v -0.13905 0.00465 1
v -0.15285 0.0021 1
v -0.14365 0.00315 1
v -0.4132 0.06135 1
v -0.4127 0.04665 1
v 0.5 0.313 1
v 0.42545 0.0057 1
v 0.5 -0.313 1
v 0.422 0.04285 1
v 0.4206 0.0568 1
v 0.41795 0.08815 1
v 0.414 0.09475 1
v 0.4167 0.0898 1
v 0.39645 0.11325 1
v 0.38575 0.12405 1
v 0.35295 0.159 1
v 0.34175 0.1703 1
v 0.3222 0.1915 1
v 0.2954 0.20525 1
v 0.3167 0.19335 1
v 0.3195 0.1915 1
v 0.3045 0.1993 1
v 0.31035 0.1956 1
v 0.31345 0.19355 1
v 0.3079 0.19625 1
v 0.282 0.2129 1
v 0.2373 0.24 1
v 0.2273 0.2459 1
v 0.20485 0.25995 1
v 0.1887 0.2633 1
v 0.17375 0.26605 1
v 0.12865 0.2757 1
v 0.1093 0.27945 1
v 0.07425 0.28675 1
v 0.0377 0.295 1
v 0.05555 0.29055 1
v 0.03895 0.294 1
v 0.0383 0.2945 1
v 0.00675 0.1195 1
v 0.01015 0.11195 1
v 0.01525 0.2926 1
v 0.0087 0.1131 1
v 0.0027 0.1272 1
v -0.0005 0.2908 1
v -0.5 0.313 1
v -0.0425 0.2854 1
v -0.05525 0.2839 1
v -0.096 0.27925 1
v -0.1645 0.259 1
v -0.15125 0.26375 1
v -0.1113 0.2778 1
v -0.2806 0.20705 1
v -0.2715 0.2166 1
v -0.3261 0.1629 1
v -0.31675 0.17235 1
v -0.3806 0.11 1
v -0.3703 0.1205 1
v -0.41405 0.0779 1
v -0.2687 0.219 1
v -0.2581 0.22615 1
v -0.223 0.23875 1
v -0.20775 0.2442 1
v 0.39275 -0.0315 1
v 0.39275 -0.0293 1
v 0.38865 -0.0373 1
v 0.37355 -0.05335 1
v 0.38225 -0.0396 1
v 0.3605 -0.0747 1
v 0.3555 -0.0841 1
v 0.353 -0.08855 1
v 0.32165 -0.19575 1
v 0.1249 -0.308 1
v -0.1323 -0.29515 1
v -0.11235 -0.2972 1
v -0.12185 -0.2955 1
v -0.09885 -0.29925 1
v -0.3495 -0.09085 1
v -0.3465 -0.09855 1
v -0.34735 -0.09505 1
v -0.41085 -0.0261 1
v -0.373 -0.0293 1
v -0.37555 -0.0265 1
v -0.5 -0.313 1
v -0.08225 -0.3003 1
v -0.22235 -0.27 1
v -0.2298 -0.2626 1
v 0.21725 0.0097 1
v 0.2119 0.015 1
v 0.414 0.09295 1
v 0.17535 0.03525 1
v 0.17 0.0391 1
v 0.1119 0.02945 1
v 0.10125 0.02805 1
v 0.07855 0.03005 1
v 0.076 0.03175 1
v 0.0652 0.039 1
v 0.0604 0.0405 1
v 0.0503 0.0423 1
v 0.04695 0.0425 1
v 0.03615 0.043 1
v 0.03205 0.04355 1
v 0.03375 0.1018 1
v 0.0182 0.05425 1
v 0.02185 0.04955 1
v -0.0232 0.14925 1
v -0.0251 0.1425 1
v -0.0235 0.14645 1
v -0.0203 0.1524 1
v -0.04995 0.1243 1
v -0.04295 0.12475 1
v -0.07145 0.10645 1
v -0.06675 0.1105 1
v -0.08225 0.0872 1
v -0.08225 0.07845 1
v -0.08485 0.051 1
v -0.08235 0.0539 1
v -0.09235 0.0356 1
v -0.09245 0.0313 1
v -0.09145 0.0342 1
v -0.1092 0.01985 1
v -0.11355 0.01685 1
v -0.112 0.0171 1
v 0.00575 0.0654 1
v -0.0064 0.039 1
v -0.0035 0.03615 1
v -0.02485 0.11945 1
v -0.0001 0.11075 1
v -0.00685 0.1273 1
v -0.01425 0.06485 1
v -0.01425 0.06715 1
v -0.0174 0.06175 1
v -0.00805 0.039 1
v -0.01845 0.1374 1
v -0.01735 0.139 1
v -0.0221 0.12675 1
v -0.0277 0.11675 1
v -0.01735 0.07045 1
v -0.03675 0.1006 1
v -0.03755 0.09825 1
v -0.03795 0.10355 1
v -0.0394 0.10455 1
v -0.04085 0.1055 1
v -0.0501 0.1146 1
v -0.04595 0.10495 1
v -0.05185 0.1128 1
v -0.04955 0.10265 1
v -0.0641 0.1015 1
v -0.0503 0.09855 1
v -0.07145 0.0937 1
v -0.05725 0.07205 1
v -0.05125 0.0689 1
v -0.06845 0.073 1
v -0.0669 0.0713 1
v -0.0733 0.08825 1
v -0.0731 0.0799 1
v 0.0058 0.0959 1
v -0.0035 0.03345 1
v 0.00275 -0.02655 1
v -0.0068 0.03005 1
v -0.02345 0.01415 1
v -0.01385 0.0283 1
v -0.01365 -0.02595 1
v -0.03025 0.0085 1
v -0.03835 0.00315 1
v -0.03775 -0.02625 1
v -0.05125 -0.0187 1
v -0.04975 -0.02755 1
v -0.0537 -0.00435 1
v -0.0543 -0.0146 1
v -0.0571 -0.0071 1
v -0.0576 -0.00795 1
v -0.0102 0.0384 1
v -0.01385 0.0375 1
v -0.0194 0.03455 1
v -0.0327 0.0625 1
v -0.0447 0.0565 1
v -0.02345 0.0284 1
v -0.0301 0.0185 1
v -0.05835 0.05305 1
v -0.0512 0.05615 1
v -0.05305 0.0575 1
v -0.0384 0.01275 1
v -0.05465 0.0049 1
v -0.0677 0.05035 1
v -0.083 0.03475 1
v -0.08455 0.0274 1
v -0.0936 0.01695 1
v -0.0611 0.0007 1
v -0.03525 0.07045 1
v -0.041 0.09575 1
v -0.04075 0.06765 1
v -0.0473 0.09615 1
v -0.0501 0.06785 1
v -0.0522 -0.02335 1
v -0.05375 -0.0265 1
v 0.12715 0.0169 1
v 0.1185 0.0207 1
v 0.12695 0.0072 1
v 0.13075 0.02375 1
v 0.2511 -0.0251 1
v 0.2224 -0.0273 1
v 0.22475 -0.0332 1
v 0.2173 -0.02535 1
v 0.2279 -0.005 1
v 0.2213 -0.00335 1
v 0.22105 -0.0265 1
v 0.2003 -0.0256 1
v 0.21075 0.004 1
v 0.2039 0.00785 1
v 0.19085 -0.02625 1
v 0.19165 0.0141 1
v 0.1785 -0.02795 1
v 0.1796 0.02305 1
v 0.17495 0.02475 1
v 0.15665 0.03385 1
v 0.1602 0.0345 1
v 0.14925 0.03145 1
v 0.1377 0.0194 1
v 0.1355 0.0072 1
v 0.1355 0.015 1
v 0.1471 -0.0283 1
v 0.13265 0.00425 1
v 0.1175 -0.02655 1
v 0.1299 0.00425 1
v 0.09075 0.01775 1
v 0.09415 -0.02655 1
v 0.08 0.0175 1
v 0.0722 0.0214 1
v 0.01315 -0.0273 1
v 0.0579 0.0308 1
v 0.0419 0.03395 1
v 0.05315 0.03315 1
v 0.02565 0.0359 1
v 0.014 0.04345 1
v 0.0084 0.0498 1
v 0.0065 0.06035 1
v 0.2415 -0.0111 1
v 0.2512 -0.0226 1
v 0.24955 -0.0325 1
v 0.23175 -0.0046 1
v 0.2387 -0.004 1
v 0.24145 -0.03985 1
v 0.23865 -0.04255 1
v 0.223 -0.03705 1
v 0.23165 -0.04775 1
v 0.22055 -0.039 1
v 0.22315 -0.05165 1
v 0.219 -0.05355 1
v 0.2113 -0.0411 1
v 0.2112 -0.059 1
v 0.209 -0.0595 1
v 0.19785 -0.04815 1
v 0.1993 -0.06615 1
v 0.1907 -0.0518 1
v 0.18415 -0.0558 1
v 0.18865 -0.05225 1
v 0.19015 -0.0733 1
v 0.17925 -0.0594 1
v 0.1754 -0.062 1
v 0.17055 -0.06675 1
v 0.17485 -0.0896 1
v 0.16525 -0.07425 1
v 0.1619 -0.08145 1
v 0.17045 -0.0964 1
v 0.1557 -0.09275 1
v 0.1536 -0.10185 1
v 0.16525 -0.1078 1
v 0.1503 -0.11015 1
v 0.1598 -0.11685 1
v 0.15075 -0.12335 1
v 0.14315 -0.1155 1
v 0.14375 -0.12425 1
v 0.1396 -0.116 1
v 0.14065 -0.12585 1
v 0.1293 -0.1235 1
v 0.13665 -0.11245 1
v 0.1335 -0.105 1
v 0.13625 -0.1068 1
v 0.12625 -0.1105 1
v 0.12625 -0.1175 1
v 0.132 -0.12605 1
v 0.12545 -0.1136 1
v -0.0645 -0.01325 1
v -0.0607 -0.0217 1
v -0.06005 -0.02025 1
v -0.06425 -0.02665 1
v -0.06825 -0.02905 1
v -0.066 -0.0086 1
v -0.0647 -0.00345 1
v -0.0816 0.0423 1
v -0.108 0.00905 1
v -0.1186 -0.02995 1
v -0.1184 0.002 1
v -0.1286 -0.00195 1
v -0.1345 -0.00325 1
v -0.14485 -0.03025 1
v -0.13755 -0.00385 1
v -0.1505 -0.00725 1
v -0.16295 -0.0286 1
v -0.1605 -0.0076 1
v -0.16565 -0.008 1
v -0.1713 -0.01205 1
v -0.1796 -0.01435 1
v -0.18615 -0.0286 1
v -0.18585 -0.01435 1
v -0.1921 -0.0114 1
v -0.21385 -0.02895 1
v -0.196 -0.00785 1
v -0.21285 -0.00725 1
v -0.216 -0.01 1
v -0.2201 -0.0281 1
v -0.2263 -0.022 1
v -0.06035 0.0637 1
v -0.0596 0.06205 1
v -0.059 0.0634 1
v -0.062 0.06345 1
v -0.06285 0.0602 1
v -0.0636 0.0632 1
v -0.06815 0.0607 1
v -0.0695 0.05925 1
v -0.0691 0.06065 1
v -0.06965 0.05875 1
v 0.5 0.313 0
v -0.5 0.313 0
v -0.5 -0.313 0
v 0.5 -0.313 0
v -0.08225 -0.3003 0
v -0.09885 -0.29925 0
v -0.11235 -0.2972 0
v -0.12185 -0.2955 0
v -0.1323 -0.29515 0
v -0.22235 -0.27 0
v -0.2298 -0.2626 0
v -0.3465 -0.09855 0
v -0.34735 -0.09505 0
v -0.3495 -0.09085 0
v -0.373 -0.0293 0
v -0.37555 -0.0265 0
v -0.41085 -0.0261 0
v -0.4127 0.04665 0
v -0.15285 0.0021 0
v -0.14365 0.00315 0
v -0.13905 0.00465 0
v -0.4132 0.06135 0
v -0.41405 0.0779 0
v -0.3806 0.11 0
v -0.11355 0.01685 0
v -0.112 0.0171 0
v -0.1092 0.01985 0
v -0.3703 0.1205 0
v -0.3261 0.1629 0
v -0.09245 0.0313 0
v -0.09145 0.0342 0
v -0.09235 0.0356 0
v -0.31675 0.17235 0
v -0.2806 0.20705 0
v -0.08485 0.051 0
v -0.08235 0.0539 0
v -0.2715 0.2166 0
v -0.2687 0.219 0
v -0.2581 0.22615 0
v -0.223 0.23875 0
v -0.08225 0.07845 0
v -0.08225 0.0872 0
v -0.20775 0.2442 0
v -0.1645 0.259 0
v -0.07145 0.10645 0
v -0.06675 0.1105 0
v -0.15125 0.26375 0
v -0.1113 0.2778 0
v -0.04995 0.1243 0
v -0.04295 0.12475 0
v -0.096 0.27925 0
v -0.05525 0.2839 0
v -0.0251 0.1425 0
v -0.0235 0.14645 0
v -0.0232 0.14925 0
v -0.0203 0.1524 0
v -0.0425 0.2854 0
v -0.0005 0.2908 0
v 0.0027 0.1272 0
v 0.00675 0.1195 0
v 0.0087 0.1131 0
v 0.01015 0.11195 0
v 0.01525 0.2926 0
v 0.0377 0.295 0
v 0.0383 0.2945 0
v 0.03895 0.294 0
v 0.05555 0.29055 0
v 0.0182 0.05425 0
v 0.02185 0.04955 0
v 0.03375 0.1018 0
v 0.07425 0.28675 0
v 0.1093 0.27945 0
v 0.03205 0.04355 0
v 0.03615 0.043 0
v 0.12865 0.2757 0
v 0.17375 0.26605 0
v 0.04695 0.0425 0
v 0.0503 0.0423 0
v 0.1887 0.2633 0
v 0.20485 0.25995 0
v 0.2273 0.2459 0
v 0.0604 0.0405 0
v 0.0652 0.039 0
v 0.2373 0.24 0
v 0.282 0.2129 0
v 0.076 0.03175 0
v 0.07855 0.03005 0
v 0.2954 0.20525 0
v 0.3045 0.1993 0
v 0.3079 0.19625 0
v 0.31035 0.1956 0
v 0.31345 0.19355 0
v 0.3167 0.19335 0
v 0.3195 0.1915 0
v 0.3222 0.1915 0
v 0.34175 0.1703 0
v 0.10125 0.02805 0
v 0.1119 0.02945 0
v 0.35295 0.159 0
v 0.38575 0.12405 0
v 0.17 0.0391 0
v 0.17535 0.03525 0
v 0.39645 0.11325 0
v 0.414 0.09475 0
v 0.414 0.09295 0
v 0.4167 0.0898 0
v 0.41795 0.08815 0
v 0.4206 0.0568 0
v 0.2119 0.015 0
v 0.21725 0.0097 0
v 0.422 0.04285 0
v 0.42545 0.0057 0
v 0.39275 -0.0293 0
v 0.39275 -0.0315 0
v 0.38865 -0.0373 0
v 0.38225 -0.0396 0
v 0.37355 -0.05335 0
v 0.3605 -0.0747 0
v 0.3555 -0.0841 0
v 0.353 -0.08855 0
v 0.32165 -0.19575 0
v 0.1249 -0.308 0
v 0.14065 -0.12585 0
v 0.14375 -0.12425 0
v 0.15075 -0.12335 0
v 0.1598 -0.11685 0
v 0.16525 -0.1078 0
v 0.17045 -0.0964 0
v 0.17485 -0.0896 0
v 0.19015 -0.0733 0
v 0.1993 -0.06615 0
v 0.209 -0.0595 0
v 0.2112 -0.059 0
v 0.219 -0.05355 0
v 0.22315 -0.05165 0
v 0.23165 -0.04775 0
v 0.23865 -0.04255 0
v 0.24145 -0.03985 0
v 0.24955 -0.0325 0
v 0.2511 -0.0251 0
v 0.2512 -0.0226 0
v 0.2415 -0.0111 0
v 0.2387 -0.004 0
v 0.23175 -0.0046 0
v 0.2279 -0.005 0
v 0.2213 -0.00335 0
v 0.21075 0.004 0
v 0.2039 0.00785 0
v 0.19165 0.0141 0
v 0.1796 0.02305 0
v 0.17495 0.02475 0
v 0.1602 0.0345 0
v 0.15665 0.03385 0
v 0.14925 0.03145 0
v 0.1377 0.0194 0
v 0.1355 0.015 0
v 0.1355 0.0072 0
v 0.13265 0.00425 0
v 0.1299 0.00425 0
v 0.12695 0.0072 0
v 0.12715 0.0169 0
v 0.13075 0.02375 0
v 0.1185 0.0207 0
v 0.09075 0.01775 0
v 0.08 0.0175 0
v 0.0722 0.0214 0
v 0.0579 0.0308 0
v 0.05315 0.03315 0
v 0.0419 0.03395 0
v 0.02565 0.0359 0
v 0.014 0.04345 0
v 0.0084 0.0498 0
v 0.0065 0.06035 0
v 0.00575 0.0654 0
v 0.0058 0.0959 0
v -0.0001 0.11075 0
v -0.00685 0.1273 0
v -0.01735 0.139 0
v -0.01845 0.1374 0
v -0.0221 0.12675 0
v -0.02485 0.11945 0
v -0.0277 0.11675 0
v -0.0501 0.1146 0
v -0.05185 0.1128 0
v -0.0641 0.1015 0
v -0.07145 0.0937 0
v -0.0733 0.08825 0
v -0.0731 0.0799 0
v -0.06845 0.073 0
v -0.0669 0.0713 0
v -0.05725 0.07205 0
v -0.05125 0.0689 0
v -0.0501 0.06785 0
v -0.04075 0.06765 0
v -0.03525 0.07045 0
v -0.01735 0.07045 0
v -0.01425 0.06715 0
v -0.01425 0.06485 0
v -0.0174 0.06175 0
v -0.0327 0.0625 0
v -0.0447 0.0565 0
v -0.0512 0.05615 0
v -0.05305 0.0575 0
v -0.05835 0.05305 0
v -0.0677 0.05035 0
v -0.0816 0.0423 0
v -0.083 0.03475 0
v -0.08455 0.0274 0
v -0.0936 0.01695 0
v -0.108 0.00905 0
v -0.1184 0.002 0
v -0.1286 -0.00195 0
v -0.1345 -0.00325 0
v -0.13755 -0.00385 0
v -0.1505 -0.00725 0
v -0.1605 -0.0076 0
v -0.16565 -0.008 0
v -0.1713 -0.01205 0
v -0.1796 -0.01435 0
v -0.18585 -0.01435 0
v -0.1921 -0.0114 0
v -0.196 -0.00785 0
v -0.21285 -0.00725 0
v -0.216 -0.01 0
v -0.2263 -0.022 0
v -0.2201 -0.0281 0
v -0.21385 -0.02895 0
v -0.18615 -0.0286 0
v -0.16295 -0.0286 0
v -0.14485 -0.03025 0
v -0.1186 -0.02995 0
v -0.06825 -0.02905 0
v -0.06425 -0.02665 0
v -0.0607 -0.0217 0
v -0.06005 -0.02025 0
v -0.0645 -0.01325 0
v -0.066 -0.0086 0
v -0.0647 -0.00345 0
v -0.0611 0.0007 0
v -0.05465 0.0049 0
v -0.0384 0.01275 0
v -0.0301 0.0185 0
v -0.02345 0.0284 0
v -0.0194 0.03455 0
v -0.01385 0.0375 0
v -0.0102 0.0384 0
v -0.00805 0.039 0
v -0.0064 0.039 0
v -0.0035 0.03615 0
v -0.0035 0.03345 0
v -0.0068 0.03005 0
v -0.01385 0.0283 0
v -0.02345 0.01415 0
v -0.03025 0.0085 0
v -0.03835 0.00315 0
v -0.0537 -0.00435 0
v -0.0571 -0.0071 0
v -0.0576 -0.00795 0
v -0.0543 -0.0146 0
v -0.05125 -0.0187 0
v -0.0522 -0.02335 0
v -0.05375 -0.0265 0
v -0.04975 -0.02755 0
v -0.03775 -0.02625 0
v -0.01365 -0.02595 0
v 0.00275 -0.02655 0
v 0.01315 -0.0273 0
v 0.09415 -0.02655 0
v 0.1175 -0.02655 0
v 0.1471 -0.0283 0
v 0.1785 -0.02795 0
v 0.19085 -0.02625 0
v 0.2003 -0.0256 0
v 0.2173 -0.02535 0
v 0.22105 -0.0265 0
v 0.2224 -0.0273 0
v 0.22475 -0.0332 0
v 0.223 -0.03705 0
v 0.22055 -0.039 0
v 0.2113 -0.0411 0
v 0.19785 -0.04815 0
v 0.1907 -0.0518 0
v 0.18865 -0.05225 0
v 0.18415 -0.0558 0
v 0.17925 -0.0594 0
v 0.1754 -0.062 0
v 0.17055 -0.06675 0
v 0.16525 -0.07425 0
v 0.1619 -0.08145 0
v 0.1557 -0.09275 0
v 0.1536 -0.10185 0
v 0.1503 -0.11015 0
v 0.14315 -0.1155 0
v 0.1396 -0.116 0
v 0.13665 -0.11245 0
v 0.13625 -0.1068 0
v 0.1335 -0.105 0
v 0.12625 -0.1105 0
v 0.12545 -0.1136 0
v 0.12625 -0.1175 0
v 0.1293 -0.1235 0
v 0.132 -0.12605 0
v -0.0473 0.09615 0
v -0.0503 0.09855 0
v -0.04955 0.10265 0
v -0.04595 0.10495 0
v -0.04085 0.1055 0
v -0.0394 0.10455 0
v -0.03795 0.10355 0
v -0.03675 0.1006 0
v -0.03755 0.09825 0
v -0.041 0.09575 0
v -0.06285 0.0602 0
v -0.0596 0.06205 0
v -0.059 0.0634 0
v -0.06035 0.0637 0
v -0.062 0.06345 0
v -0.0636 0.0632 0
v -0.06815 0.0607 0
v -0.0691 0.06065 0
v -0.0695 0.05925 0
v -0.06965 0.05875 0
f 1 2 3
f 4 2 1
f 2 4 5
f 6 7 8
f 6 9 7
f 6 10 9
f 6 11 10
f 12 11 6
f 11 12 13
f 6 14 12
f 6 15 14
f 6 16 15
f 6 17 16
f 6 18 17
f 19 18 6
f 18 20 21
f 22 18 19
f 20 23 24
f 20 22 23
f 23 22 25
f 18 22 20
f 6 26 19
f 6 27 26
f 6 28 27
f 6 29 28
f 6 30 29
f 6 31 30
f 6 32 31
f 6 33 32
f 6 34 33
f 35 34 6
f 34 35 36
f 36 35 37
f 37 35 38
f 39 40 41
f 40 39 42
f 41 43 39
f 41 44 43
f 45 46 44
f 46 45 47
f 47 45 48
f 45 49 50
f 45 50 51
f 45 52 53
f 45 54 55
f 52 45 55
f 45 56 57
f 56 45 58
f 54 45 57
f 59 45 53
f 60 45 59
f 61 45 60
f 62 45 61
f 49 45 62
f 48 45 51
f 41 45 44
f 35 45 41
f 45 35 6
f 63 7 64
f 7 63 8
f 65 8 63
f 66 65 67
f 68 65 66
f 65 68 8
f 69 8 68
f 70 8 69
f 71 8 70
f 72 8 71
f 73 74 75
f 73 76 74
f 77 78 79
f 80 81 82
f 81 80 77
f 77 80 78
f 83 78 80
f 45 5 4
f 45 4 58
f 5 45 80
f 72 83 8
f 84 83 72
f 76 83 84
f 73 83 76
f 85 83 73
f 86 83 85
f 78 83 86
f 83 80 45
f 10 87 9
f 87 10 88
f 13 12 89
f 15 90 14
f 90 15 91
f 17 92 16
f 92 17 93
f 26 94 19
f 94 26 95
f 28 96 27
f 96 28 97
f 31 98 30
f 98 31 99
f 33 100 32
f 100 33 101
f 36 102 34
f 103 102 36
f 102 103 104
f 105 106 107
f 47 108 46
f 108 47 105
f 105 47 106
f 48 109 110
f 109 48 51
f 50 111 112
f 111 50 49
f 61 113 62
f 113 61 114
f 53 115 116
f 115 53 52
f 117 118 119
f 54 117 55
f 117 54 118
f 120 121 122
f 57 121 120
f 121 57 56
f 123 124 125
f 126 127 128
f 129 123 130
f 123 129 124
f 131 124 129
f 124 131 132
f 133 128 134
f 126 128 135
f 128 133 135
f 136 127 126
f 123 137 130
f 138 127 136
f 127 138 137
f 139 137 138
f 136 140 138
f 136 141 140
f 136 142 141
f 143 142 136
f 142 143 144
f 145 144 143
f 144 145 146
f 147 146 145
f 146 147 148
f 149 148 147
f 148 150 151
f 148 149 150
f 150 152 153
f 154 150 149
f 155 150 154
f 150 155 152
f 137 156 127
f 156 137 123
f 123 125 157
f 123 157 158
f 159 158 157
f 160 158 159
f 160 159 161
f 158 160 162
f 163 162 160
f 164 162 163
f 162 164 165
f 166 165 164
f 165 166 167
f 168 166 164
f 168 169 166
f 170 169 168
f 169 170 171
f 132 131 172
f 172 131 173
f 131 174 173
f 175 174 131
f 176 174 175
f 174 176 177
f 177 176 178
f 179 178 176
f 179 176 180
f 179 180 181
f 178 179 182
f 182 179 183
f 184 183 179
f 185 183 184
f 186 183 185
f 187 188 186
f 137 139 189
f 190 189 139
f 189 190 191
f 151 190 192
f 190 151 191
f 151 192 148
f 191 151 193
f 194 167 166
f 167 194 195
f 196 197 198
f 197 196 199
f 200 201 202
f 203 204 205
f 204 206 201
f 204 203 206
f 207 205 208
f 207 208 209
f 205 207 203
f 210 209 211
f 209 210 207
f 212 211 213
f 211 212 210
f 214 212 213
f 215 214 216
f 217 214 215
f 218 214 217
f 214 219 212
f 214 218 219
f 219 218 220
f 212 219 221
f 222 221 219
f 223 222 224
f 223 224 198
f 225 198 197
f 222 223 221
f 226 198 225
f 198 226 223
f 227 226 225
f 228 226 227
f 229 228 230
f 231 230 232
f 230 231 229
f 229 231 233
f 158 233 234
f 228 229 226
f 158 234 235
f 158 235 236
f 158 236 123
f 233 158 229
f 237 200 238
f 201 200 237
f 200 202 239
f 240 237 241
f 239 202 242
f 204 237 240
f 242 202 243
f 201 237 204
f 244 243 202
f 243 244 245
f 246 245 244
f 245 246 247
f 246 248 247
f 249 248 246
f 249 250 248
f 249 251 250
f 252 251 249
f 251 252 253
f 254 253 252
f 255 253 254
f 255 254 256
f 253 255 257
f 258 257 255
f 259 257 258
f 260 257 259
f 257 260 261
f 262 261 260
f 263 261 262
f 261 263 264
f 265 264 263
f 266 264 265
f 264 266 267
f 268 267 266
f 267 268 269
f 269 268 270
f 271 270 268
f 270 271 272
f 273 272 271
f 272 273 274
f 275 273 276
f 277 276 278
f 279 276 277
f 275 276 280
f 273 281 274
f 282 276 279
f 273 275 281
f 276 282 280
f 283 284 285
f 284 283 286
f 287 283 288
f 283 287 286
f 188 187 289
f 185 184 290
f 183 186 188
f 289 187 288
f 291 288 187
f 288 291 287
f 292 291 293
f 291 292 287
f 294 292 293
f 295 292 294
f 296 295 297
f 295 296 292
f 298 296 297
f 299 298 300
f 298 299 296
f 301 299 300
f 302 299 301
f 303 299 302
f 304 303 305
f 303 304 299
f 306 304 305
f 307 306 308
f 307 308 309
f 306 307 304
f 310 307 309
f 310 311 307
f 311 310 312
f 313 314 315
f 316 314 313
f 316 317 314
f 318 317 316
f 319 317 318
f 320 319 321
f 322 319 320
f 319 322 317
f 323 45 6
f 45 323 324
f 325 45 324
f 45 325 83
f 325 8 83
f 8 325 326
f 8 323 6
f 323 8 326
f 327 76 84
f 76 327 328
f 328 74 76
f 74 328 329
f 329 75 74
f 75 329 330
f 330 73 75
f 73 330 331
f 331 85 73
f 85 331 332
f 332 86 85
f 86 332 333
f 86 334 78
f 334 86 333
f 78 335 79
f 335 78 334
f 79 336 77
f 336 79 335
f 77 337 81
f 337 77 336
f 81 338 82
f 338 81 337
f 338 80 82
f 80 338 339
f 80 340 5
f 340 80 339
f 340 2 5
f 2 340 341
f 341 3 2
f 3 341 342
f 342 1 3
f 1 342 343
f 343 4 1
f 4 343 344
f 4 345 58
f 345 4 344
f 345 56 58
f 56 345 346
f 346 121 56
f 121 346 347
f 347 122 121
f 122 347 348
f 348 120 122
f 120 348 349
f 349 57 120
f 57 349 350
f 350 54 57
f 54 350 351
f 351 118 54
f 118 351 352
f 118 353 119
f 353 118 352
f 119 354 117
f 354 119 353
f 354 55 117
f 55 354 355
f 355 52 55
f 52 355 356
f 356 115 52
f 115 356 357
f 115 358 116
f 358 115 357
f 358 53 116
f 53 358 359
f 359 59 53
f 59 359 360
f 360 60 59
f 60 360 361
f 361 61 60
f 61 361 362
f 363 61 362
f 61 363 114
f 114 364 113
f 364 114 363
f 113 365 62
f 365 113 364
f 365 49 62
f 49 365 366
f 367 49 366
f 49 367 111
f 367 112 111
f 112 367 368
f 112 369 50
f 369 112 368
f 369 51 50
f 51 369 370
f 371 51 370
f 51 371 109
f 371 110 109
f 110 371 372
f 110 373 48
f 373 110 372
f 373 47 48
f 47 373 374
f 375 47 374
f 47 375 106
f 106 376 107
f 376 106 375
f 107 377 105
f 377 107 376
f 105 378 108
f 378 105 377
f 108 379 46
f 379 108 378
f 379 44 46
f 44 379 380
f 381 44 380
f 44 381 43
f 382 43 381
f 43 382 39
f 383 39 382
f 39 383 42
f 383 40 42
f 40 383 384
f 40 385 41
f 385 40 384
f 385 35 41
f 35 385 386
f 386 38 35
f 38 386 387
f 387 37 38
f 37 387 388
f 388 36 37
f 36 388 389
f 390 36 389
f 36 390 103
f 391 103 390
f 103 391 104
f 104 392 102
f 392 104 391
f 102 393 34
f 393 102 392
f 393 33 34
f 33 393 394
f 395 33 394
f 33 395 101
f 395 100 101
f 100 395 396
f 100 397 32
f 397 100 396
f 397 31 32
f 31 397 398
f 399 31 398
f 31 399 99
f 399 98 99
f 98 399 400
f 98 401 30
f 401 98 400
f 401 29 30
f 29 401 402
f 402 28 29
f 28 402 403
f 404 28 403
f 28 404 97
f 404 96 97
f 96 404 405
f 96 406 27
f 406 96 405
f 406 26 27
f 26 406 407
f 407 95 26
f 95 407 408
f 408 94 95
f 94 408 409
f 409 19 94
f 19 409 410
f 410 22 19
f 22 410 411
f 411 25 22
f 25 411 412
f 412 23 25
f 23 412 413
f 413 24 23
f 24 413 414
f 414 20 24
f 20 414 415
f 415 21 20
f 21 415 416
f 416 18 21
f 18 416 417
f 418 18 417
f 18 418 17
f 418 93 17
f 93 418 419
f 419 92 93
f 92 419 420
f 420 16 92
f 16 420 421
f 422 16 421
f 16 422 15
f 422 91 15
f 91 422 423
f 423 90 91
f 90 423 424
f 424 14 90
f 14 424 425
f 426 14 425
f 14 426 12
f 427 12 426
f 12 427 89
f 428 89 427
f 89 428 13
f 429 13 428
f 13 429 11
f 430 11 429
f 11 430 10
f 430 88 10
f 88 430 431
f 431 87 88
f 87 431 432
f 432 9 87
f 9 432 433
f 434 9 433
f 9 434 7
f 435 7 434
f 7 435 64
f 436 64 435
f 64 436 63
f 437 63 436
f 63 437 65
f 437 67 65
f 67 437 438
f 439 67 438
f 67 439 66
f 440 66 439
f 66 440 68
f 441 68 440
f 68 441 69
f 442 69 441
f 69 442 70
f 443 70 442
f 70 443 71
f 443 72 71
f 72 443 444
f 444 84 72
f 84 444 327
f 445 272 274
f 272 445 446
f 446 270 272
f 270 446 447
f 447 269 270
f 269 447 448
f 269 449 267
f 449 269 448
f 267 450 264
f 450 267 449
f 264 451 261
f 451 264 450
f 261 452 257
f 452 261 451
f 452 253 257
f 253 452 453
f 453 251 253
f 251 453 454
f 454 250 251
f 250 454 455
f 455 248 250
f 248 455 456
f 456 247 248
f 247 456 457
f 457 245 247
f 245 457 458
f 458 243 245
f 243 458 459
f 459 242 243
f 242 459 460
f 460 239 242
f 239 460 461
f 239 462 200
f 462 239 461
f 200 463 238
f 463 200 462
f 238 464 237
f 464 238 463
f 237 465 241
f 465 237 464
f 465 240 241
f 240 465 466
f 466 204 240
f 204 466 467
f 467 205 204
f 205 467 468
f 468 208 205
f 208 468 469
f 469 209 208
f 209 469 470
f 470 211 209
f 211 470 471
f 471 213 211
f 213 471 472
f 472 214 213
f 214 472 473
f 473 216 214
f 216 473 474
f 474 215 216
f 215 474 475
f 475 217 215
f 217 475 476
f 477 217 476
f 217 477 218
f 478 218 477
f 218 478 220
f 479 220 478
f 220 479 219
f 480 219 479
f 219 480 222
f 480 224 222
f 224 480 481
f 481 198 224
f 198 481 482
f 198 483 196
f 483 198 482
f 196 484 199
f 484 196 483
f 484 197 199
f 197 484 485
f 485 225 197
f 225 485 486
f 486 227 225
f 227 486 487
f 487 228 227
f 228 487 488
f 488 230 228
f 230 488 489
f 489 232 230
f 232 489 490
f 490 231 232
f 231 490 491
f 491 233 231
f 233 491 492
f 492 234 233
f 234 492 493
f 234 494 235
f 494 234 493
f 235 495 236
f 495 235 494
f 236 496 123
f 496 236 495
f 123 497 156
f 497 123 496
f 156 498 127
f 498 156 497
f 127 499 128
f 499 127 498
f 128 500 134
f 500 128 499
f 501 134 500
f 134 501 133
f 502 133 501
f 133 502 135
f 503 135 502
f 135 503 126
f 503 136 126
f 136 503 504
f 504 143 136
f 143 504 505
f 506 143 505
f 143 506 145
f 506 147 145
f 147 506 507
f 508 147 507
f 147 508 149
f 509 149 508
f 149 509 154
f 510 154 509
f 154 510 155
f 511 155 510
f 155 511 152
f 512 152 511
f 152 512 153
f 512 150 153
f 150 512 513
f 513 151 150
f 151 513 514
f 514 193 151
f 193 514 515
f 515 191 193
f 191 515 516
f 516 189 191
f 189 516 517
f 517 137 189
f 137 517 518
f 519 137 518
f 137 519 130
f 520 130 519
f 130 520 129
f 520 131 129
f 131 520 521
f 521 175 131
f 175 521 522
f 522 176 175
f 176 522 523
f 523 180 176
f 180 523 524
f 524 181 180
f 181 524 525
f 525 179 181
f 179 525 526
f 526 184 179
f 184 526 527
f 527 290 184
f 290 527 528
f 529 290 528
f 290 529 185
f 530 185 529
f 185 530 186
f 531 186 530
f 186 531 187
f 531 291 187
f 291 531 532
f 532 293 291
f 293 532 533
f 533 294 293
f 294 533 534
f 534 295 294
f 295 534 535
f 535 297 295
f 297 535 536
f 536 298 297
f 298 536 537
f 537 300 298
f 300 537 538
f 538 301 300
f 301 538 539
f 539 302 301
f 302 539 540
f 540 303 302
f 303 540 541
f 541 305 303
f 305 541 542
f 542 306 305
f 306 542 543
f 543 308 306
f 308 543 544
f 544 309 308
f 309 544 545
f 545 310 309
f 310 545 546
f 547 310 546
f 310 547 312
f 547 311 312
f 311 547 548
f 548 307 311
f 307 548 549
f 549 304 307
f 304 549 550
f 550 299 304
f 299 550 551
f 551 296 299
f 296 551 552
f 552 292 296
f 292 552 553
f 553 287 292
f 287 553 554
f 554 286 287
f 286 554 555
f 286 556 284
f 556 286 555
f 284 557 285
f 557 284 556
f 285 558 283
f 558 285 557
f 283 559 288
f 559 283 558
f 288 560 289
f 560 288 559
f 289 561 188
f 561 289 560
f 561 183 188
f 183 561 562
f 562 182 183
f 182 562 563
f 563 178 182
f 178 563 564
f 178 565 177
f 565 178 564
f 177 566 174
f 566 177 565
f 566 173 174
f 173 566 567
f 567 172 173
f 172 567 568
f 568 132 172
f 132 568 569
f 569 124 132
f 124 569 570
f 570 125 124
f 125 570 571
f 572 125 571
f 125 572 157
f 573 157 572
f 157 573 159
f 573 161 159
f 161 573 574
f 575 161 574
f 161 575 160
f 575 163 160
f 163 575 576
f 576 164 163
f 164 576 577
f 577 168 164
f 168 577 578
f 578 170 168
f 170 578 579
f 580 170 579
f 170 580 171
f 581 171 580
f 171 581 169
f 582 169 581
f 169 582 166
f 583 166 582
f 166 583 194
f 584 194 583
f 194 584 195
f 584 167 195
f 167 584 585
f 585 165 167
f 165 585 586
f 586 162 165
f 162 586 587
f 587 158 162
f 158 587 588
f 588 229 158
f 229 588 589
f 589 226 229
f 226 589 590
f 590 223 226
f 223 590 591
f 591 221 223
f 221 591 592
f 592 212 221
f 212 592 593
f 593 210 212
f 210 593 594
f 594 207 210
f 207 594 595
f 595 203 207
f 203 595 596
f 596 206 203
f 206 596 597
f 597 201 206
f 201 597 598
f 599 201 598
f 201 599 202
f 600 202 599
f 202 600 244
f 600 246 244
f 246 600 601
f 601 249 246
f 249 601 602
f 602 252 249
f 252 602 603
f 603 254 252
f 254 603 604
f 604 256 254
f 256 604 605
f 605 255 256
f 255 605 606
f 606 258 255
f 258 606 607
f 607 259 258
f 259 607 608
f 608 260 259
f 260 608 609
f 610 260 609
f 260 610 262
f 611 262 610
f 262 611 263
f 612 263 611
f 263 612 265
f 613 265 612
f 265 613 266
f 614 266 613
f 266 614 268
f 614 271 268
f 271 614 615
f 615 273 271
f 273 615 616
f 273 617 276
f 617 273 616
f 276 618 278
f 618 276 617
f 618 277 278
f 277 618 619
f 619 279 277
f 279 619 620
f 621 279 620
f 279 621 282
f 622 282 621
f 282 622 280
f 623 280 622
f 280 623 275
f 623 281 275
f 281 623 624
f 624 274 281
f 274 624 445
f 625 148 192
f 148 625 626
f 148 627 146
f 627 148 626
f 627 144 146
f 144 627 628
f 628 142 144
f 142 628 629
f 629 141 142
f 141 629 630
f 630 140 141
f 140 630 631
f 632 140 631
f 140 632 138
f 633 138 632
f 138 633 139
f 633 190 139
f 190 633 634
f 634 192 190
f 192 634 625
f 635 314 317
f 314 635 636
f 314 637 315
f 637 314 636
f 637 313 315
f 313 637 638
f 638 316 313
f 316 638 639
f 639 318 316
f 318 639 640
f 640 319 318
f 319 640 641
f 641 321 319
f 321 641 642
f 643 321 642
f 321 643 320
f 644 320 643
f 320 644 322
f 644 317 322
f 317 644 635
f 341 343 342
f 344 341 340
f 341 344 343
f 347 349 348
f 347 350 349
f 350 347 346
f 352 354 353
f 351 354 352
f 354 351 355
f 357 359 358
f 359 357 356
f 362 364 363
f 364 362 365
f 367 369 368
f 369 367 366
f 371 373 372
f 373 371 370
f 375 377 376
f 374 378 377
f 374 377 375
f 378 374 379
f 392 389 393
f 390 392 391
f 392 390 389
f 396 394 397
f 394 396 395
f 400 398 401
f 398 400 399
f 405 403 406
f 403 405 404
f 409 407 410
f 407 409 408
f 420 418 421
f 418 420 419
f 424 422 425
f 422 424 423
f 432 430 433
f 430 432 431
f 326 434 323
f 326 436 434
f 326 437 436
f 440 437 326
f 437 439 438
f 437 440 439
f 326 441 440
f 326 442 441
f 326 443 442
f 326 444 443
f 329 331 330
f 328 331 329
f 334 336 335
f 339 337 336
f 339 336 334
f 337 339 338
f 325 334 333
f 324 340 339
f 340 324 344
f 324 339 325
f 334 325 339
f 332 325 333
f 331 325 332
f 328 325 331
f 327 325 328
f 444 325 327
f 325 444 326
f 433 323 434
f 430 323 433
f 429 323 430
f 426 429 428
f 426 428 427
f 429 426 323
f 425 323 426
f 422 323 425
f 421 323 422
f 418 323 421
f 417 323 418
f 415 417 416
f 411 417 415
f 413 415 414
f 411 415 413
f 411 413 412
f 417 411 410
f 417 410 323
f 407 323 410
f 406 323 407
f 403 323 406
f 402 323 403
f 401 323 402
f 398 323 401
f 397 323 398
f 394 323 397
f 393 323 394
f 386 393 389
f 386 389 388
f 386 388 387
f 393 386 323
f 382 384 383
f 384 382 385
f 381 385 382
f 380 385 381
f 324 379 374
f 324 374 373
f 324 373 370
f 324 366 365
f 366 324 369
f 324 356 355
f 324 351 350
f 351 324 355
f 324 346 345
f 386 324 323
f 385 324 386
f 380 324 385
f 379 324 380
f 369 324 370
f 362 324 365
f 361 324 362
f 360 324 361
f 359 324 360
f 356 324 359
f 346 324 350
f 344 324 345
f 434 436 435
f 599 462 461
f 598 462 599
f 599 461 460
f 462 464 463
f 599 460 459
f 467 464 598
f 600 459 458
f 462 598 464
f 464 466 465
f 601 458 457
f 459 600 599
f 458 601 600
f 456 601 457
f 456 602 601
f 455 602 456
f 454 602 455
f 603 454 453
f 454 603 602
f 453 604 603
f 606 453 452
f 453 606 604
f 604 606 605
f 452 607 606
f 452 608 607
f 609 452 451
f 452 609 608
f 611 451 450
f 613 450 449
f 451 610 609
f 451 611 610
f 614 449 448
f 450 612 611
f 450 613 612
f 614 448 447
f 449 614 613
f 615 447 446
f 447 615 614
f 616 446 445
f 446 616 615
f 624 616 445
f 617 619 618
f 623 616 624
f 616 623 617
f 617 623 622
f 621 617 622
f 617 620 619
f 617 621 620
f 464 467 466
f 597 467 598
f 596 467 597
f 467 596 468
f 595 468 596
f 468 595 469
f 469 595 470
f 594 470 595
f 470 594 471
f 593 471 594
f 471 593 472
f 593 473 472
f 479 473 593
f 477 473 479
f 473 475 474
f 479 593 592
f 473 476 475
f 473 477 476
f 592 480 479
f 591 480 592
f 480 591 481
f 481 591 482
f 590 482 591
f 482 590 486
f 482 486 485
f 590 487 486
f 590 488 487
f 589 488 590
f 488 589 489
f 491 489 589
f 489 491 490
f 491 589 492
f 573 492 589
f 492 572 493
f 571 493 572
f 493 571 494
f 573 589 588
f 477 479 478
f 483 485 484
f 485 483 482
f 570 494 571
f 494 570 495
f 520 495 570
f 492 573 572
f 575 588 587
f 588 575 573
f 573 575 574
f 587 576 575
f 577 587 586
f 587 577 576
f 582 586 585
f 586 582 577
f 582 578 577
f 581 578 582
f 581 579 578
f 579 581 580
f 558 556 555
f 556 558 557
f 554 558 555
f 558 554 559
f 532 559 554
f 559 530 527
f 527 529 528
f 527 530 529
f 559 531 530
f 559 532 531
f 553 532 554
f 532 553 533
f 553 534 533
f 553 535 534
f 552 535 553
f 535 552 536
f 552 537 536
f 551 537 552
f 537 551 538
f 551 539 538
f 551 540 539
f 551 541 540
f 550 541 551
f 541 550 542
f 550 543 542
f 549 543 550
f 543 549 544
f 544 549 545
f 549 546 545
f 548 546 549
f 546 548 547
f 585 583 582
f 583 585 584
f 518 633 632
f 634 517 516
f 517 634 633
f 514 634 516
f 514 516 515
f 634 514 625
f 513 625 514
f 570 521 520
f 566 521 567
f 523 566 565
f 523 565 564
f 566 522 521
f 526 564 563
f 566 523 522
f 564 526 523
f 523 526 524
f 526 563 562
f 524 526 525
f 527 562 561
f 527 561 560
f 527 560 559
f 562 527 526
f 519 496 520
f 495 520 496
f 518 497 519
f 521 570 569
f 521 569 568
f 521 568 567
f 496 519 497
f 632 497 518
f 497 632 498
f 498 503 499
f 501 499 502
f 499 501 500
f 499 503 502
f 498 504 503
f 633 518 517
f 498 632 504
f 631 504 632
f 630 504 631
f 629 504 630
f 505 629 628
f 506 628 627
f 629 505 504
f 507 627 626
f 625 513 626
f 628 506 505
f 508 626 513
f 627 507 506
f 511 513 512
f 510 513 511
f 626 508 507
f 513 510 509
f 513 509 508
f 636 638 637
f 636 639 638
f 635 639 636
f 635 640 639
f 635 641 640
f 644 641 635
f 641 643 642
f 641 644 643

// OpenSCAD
module fan9black_1()
{
 /* Generated by trace2scad version 20150415
    http://aggregate.org/MAKE/TRACE2SCAD/
    Optimized model has 324/4227 original points
 */
  minx=0; /* polygon minx=0 */
  miny=0; /* polygon miny=0 */
  maxx=20000; /* polygon maxx=20000 */
  maxy=12520; /* polygon maxy=12520 */
  dx=maxx-minx;
  dy=maxy-miny;
  maxd=((dx>dy)?dx:dy);
 scale([1/maxd, 1/maxd, 1])
 translate([-minx-dx/2, -miny-dy/2, 0])
 linear_extrude(height=1, convexity=324)
 union() {
  union() {
   union() {
    difference() {
     polygon([[0,6260],[0,0],[20000,0],[20000,12520],[0,12520]], convexity=5);
     polygon([[10766,12150],[10779,12140],[11111,12071],[10364,7345],[10437,7251],[10675,8296],[11485,11995],[12186,11849],[10641,7131],[10723,7120],[12573,11774],[13475,11581],[10939,7110],[11006,7106],[13774,11526],[14097,11459],[14546,11178],[11208,7070],[11304,7040],[14746,11060],[15640,10518],[11520,6895],[11571,6861],[15908,10365],[16090,10246],[16158,10185],[16207,10172],[16269,10131],[16334,10127],[16390,10090],[16444,10090],[16835,9666],[12025,6821],[12238,6849],[17059,9440],[17715,8741],[13400,7042],[13507,6965],[17929,8525],[18280,8155],[18280,8119],[18334,8056],[18359,8023],[18412,7396],[14238,6560],[14345,6454],[18440,7117],[18509,6374],[17855,5674],[17855,5630],[17773,5514],[17645,5468],[17471,5193],[17210,4766],[17110,4578],[17060,4489],[16433,2345],[12498,100],[8355,254],[8023,275],[7753,316],[7563,350],[7354,357],[5553,860],[5404,1008],[3070,4289],[3053,4359],[3010,4443],[2540,5674],[2489,5730],[1783,5738],[1746,7193],[6943,6302],[7127,6323],[7219,6353],[1736,7487],[1719,7818],[2388,8460],[7729,6597],[7760,6602],[7816,6657],[2594,8670],[3478,9518],[8151,6886],[8171,6944],[8153,6972],[3665,9707],[4388,10401],[8303,7280],[8353,7338],[4570,10592],[4626,10640],[4838,10783],[5540,11035],[8355,7829],[8355,8004],[5845,11144],[6710,11440],[8571,8389],[8665,8470],[6975,11535],[7774,11816],[9001,8746],[9141,8755],[8080,11845],[8895,11938],[9498,9110],[9530,9189],[9536,9245],[9594,9308],[9150,11968],[9990,12076],[10054,8804],[10135,8650],[10174,8522],[10203,8499],[10305,12112],[10754,12160]], convexity=74);
    }
    union() {
     difference() {
      polygon([[9642,9024],[9631,9008],[9558,8795],[9503,8649],[9446,8595],[8998,8552],[8963,8516],[8718,8290],[8571,8134],[8534,8025],[8538,7858],[8631,7720],[8662,7686],[8855,7701],[8975,7638],[8998,7617],[9185,7613],[9295,7669],[9653,7669],[9715,7603],[9715,7557],[9652,7495],[9346,7510],[9106,7390],[8976,7383],[8939,7410],[8833,7321],[8646,7267],[8368,7106],[8340,6955],[8309,6808],[8128,6599],[7840,6441],[7632,6300],[7428,6221],[7310,6195],[7249,6183],[6990,6115],[6790,6108],[6687,6100],[6574,6019],[6408,5973],[6283,5973],[6158,6032],[6080,6103],[5743,6115],[5680,6060],[5474,5820],[5598,5698],[5723,5681],[6277,5688],[6741,5688],[7103,5655],[7628,5661],[8635,5679],[8715,5727],[8786,5826],[8799,5855],[8710,5995],[8680,6088],[8706,6191],[8778,6274],[8907,6358],[9232,6515],[9398,6630],[9531,6828],[9612,6951],[9723,7010],[9796,7028],[9839,7040],[9872,7040],[9930,6983],[9930,6929],[9864,6861],[9723,6826],[9531,6543],[9395,6430],[9233,6323],[8926,6173],[8858,6118],[8848,6101],[8914,5968],[8975,5886],[8956,5793],[8925,5730],[9005,5709],[9245,5735],[9727,5741],[10055,5729],[10263,5714],[11883,5729],[12350,5729],[12942,5694],[13570,5701],[13817,5735],[14006,5748],[14346,5753],[14421,5730],[14448,5714],[14495,5596],[14460,5519],[14411,5480],[14226,5438],[13957,5297],[13814,5224],[13773,5215],[13683,5144],[13585,5072],[13508,5020],[13411,4925],[13305,4775],[13238,4631],[13114,4405],[13072,4223],[13006,4057],[12863,3950],[12792,3940],[12733,4011],[12725,4124],[12670,4160],[12525,4050],[12509,3988],[12525,3910],[12586,3790],[12640,3739],[12813,3743],[12875,3775],[13015,3793],[13196,3923],[13305,4104],[13409,4332],[13497,4468],[13803,4794],[13986,4937],[14180,5070],[14224,5080],[14380,5189],[14463,5227],[14633,5305],[14773,5409],[14829,5463],[14991,5610],[15022,5758],[15024,5808],[14830,6038],[14774,6180],[14635,6168],[14558,6160],[14426,6193],[14215,6340],[14078,6417],[13833,6542],[13592,6721],[13499,6755],[13204,6950],[13133,6937],[12985,6889],[12754,6648],[12710,6560],[12710,6404],[12653,6345],[12598,6345],[12539,6404],[12543,6598],[12615,6735],[12370,6674],[11815,6615],[11600,6610],[11444,6688],[11158,6876],[11063,6923],[10838,6939],[10513,6978],[10280,7129],[10168,7256],[10130,7467],[10115,7568],[10116,8178],[9998,8475],[9863,8806],[9653,9040]], convexity=49);
      polygon([[9212,8351],[9241,8331],[9265,8272],[9249,8225],[9180,8175],[9054,8183],[8994,8231],[9009,8313],[9081,8359],[9183,8370]], convexity=6);
     }
    }
    polygon([[8760,7529],[8728,7524],[8637,7474],[8618,7473],[8610,7445],[8607,7435],[8743,7464],[8808,7501],[8820,7528],[8793,7534]], convexity=5);
   }
  }
 }
}

module fan9black()
{
 /* all layers combined, scaled to within a 1mm cube */
 scale([1, 1, 1/1])
 difference() {
  union() {
   scale([1,1,2]) translate([0,0,-0.5]) fan9black_1();
  }
  translate([0,0,-2]) cube([2,2,4],center=true);
 }
}
fan9black();
